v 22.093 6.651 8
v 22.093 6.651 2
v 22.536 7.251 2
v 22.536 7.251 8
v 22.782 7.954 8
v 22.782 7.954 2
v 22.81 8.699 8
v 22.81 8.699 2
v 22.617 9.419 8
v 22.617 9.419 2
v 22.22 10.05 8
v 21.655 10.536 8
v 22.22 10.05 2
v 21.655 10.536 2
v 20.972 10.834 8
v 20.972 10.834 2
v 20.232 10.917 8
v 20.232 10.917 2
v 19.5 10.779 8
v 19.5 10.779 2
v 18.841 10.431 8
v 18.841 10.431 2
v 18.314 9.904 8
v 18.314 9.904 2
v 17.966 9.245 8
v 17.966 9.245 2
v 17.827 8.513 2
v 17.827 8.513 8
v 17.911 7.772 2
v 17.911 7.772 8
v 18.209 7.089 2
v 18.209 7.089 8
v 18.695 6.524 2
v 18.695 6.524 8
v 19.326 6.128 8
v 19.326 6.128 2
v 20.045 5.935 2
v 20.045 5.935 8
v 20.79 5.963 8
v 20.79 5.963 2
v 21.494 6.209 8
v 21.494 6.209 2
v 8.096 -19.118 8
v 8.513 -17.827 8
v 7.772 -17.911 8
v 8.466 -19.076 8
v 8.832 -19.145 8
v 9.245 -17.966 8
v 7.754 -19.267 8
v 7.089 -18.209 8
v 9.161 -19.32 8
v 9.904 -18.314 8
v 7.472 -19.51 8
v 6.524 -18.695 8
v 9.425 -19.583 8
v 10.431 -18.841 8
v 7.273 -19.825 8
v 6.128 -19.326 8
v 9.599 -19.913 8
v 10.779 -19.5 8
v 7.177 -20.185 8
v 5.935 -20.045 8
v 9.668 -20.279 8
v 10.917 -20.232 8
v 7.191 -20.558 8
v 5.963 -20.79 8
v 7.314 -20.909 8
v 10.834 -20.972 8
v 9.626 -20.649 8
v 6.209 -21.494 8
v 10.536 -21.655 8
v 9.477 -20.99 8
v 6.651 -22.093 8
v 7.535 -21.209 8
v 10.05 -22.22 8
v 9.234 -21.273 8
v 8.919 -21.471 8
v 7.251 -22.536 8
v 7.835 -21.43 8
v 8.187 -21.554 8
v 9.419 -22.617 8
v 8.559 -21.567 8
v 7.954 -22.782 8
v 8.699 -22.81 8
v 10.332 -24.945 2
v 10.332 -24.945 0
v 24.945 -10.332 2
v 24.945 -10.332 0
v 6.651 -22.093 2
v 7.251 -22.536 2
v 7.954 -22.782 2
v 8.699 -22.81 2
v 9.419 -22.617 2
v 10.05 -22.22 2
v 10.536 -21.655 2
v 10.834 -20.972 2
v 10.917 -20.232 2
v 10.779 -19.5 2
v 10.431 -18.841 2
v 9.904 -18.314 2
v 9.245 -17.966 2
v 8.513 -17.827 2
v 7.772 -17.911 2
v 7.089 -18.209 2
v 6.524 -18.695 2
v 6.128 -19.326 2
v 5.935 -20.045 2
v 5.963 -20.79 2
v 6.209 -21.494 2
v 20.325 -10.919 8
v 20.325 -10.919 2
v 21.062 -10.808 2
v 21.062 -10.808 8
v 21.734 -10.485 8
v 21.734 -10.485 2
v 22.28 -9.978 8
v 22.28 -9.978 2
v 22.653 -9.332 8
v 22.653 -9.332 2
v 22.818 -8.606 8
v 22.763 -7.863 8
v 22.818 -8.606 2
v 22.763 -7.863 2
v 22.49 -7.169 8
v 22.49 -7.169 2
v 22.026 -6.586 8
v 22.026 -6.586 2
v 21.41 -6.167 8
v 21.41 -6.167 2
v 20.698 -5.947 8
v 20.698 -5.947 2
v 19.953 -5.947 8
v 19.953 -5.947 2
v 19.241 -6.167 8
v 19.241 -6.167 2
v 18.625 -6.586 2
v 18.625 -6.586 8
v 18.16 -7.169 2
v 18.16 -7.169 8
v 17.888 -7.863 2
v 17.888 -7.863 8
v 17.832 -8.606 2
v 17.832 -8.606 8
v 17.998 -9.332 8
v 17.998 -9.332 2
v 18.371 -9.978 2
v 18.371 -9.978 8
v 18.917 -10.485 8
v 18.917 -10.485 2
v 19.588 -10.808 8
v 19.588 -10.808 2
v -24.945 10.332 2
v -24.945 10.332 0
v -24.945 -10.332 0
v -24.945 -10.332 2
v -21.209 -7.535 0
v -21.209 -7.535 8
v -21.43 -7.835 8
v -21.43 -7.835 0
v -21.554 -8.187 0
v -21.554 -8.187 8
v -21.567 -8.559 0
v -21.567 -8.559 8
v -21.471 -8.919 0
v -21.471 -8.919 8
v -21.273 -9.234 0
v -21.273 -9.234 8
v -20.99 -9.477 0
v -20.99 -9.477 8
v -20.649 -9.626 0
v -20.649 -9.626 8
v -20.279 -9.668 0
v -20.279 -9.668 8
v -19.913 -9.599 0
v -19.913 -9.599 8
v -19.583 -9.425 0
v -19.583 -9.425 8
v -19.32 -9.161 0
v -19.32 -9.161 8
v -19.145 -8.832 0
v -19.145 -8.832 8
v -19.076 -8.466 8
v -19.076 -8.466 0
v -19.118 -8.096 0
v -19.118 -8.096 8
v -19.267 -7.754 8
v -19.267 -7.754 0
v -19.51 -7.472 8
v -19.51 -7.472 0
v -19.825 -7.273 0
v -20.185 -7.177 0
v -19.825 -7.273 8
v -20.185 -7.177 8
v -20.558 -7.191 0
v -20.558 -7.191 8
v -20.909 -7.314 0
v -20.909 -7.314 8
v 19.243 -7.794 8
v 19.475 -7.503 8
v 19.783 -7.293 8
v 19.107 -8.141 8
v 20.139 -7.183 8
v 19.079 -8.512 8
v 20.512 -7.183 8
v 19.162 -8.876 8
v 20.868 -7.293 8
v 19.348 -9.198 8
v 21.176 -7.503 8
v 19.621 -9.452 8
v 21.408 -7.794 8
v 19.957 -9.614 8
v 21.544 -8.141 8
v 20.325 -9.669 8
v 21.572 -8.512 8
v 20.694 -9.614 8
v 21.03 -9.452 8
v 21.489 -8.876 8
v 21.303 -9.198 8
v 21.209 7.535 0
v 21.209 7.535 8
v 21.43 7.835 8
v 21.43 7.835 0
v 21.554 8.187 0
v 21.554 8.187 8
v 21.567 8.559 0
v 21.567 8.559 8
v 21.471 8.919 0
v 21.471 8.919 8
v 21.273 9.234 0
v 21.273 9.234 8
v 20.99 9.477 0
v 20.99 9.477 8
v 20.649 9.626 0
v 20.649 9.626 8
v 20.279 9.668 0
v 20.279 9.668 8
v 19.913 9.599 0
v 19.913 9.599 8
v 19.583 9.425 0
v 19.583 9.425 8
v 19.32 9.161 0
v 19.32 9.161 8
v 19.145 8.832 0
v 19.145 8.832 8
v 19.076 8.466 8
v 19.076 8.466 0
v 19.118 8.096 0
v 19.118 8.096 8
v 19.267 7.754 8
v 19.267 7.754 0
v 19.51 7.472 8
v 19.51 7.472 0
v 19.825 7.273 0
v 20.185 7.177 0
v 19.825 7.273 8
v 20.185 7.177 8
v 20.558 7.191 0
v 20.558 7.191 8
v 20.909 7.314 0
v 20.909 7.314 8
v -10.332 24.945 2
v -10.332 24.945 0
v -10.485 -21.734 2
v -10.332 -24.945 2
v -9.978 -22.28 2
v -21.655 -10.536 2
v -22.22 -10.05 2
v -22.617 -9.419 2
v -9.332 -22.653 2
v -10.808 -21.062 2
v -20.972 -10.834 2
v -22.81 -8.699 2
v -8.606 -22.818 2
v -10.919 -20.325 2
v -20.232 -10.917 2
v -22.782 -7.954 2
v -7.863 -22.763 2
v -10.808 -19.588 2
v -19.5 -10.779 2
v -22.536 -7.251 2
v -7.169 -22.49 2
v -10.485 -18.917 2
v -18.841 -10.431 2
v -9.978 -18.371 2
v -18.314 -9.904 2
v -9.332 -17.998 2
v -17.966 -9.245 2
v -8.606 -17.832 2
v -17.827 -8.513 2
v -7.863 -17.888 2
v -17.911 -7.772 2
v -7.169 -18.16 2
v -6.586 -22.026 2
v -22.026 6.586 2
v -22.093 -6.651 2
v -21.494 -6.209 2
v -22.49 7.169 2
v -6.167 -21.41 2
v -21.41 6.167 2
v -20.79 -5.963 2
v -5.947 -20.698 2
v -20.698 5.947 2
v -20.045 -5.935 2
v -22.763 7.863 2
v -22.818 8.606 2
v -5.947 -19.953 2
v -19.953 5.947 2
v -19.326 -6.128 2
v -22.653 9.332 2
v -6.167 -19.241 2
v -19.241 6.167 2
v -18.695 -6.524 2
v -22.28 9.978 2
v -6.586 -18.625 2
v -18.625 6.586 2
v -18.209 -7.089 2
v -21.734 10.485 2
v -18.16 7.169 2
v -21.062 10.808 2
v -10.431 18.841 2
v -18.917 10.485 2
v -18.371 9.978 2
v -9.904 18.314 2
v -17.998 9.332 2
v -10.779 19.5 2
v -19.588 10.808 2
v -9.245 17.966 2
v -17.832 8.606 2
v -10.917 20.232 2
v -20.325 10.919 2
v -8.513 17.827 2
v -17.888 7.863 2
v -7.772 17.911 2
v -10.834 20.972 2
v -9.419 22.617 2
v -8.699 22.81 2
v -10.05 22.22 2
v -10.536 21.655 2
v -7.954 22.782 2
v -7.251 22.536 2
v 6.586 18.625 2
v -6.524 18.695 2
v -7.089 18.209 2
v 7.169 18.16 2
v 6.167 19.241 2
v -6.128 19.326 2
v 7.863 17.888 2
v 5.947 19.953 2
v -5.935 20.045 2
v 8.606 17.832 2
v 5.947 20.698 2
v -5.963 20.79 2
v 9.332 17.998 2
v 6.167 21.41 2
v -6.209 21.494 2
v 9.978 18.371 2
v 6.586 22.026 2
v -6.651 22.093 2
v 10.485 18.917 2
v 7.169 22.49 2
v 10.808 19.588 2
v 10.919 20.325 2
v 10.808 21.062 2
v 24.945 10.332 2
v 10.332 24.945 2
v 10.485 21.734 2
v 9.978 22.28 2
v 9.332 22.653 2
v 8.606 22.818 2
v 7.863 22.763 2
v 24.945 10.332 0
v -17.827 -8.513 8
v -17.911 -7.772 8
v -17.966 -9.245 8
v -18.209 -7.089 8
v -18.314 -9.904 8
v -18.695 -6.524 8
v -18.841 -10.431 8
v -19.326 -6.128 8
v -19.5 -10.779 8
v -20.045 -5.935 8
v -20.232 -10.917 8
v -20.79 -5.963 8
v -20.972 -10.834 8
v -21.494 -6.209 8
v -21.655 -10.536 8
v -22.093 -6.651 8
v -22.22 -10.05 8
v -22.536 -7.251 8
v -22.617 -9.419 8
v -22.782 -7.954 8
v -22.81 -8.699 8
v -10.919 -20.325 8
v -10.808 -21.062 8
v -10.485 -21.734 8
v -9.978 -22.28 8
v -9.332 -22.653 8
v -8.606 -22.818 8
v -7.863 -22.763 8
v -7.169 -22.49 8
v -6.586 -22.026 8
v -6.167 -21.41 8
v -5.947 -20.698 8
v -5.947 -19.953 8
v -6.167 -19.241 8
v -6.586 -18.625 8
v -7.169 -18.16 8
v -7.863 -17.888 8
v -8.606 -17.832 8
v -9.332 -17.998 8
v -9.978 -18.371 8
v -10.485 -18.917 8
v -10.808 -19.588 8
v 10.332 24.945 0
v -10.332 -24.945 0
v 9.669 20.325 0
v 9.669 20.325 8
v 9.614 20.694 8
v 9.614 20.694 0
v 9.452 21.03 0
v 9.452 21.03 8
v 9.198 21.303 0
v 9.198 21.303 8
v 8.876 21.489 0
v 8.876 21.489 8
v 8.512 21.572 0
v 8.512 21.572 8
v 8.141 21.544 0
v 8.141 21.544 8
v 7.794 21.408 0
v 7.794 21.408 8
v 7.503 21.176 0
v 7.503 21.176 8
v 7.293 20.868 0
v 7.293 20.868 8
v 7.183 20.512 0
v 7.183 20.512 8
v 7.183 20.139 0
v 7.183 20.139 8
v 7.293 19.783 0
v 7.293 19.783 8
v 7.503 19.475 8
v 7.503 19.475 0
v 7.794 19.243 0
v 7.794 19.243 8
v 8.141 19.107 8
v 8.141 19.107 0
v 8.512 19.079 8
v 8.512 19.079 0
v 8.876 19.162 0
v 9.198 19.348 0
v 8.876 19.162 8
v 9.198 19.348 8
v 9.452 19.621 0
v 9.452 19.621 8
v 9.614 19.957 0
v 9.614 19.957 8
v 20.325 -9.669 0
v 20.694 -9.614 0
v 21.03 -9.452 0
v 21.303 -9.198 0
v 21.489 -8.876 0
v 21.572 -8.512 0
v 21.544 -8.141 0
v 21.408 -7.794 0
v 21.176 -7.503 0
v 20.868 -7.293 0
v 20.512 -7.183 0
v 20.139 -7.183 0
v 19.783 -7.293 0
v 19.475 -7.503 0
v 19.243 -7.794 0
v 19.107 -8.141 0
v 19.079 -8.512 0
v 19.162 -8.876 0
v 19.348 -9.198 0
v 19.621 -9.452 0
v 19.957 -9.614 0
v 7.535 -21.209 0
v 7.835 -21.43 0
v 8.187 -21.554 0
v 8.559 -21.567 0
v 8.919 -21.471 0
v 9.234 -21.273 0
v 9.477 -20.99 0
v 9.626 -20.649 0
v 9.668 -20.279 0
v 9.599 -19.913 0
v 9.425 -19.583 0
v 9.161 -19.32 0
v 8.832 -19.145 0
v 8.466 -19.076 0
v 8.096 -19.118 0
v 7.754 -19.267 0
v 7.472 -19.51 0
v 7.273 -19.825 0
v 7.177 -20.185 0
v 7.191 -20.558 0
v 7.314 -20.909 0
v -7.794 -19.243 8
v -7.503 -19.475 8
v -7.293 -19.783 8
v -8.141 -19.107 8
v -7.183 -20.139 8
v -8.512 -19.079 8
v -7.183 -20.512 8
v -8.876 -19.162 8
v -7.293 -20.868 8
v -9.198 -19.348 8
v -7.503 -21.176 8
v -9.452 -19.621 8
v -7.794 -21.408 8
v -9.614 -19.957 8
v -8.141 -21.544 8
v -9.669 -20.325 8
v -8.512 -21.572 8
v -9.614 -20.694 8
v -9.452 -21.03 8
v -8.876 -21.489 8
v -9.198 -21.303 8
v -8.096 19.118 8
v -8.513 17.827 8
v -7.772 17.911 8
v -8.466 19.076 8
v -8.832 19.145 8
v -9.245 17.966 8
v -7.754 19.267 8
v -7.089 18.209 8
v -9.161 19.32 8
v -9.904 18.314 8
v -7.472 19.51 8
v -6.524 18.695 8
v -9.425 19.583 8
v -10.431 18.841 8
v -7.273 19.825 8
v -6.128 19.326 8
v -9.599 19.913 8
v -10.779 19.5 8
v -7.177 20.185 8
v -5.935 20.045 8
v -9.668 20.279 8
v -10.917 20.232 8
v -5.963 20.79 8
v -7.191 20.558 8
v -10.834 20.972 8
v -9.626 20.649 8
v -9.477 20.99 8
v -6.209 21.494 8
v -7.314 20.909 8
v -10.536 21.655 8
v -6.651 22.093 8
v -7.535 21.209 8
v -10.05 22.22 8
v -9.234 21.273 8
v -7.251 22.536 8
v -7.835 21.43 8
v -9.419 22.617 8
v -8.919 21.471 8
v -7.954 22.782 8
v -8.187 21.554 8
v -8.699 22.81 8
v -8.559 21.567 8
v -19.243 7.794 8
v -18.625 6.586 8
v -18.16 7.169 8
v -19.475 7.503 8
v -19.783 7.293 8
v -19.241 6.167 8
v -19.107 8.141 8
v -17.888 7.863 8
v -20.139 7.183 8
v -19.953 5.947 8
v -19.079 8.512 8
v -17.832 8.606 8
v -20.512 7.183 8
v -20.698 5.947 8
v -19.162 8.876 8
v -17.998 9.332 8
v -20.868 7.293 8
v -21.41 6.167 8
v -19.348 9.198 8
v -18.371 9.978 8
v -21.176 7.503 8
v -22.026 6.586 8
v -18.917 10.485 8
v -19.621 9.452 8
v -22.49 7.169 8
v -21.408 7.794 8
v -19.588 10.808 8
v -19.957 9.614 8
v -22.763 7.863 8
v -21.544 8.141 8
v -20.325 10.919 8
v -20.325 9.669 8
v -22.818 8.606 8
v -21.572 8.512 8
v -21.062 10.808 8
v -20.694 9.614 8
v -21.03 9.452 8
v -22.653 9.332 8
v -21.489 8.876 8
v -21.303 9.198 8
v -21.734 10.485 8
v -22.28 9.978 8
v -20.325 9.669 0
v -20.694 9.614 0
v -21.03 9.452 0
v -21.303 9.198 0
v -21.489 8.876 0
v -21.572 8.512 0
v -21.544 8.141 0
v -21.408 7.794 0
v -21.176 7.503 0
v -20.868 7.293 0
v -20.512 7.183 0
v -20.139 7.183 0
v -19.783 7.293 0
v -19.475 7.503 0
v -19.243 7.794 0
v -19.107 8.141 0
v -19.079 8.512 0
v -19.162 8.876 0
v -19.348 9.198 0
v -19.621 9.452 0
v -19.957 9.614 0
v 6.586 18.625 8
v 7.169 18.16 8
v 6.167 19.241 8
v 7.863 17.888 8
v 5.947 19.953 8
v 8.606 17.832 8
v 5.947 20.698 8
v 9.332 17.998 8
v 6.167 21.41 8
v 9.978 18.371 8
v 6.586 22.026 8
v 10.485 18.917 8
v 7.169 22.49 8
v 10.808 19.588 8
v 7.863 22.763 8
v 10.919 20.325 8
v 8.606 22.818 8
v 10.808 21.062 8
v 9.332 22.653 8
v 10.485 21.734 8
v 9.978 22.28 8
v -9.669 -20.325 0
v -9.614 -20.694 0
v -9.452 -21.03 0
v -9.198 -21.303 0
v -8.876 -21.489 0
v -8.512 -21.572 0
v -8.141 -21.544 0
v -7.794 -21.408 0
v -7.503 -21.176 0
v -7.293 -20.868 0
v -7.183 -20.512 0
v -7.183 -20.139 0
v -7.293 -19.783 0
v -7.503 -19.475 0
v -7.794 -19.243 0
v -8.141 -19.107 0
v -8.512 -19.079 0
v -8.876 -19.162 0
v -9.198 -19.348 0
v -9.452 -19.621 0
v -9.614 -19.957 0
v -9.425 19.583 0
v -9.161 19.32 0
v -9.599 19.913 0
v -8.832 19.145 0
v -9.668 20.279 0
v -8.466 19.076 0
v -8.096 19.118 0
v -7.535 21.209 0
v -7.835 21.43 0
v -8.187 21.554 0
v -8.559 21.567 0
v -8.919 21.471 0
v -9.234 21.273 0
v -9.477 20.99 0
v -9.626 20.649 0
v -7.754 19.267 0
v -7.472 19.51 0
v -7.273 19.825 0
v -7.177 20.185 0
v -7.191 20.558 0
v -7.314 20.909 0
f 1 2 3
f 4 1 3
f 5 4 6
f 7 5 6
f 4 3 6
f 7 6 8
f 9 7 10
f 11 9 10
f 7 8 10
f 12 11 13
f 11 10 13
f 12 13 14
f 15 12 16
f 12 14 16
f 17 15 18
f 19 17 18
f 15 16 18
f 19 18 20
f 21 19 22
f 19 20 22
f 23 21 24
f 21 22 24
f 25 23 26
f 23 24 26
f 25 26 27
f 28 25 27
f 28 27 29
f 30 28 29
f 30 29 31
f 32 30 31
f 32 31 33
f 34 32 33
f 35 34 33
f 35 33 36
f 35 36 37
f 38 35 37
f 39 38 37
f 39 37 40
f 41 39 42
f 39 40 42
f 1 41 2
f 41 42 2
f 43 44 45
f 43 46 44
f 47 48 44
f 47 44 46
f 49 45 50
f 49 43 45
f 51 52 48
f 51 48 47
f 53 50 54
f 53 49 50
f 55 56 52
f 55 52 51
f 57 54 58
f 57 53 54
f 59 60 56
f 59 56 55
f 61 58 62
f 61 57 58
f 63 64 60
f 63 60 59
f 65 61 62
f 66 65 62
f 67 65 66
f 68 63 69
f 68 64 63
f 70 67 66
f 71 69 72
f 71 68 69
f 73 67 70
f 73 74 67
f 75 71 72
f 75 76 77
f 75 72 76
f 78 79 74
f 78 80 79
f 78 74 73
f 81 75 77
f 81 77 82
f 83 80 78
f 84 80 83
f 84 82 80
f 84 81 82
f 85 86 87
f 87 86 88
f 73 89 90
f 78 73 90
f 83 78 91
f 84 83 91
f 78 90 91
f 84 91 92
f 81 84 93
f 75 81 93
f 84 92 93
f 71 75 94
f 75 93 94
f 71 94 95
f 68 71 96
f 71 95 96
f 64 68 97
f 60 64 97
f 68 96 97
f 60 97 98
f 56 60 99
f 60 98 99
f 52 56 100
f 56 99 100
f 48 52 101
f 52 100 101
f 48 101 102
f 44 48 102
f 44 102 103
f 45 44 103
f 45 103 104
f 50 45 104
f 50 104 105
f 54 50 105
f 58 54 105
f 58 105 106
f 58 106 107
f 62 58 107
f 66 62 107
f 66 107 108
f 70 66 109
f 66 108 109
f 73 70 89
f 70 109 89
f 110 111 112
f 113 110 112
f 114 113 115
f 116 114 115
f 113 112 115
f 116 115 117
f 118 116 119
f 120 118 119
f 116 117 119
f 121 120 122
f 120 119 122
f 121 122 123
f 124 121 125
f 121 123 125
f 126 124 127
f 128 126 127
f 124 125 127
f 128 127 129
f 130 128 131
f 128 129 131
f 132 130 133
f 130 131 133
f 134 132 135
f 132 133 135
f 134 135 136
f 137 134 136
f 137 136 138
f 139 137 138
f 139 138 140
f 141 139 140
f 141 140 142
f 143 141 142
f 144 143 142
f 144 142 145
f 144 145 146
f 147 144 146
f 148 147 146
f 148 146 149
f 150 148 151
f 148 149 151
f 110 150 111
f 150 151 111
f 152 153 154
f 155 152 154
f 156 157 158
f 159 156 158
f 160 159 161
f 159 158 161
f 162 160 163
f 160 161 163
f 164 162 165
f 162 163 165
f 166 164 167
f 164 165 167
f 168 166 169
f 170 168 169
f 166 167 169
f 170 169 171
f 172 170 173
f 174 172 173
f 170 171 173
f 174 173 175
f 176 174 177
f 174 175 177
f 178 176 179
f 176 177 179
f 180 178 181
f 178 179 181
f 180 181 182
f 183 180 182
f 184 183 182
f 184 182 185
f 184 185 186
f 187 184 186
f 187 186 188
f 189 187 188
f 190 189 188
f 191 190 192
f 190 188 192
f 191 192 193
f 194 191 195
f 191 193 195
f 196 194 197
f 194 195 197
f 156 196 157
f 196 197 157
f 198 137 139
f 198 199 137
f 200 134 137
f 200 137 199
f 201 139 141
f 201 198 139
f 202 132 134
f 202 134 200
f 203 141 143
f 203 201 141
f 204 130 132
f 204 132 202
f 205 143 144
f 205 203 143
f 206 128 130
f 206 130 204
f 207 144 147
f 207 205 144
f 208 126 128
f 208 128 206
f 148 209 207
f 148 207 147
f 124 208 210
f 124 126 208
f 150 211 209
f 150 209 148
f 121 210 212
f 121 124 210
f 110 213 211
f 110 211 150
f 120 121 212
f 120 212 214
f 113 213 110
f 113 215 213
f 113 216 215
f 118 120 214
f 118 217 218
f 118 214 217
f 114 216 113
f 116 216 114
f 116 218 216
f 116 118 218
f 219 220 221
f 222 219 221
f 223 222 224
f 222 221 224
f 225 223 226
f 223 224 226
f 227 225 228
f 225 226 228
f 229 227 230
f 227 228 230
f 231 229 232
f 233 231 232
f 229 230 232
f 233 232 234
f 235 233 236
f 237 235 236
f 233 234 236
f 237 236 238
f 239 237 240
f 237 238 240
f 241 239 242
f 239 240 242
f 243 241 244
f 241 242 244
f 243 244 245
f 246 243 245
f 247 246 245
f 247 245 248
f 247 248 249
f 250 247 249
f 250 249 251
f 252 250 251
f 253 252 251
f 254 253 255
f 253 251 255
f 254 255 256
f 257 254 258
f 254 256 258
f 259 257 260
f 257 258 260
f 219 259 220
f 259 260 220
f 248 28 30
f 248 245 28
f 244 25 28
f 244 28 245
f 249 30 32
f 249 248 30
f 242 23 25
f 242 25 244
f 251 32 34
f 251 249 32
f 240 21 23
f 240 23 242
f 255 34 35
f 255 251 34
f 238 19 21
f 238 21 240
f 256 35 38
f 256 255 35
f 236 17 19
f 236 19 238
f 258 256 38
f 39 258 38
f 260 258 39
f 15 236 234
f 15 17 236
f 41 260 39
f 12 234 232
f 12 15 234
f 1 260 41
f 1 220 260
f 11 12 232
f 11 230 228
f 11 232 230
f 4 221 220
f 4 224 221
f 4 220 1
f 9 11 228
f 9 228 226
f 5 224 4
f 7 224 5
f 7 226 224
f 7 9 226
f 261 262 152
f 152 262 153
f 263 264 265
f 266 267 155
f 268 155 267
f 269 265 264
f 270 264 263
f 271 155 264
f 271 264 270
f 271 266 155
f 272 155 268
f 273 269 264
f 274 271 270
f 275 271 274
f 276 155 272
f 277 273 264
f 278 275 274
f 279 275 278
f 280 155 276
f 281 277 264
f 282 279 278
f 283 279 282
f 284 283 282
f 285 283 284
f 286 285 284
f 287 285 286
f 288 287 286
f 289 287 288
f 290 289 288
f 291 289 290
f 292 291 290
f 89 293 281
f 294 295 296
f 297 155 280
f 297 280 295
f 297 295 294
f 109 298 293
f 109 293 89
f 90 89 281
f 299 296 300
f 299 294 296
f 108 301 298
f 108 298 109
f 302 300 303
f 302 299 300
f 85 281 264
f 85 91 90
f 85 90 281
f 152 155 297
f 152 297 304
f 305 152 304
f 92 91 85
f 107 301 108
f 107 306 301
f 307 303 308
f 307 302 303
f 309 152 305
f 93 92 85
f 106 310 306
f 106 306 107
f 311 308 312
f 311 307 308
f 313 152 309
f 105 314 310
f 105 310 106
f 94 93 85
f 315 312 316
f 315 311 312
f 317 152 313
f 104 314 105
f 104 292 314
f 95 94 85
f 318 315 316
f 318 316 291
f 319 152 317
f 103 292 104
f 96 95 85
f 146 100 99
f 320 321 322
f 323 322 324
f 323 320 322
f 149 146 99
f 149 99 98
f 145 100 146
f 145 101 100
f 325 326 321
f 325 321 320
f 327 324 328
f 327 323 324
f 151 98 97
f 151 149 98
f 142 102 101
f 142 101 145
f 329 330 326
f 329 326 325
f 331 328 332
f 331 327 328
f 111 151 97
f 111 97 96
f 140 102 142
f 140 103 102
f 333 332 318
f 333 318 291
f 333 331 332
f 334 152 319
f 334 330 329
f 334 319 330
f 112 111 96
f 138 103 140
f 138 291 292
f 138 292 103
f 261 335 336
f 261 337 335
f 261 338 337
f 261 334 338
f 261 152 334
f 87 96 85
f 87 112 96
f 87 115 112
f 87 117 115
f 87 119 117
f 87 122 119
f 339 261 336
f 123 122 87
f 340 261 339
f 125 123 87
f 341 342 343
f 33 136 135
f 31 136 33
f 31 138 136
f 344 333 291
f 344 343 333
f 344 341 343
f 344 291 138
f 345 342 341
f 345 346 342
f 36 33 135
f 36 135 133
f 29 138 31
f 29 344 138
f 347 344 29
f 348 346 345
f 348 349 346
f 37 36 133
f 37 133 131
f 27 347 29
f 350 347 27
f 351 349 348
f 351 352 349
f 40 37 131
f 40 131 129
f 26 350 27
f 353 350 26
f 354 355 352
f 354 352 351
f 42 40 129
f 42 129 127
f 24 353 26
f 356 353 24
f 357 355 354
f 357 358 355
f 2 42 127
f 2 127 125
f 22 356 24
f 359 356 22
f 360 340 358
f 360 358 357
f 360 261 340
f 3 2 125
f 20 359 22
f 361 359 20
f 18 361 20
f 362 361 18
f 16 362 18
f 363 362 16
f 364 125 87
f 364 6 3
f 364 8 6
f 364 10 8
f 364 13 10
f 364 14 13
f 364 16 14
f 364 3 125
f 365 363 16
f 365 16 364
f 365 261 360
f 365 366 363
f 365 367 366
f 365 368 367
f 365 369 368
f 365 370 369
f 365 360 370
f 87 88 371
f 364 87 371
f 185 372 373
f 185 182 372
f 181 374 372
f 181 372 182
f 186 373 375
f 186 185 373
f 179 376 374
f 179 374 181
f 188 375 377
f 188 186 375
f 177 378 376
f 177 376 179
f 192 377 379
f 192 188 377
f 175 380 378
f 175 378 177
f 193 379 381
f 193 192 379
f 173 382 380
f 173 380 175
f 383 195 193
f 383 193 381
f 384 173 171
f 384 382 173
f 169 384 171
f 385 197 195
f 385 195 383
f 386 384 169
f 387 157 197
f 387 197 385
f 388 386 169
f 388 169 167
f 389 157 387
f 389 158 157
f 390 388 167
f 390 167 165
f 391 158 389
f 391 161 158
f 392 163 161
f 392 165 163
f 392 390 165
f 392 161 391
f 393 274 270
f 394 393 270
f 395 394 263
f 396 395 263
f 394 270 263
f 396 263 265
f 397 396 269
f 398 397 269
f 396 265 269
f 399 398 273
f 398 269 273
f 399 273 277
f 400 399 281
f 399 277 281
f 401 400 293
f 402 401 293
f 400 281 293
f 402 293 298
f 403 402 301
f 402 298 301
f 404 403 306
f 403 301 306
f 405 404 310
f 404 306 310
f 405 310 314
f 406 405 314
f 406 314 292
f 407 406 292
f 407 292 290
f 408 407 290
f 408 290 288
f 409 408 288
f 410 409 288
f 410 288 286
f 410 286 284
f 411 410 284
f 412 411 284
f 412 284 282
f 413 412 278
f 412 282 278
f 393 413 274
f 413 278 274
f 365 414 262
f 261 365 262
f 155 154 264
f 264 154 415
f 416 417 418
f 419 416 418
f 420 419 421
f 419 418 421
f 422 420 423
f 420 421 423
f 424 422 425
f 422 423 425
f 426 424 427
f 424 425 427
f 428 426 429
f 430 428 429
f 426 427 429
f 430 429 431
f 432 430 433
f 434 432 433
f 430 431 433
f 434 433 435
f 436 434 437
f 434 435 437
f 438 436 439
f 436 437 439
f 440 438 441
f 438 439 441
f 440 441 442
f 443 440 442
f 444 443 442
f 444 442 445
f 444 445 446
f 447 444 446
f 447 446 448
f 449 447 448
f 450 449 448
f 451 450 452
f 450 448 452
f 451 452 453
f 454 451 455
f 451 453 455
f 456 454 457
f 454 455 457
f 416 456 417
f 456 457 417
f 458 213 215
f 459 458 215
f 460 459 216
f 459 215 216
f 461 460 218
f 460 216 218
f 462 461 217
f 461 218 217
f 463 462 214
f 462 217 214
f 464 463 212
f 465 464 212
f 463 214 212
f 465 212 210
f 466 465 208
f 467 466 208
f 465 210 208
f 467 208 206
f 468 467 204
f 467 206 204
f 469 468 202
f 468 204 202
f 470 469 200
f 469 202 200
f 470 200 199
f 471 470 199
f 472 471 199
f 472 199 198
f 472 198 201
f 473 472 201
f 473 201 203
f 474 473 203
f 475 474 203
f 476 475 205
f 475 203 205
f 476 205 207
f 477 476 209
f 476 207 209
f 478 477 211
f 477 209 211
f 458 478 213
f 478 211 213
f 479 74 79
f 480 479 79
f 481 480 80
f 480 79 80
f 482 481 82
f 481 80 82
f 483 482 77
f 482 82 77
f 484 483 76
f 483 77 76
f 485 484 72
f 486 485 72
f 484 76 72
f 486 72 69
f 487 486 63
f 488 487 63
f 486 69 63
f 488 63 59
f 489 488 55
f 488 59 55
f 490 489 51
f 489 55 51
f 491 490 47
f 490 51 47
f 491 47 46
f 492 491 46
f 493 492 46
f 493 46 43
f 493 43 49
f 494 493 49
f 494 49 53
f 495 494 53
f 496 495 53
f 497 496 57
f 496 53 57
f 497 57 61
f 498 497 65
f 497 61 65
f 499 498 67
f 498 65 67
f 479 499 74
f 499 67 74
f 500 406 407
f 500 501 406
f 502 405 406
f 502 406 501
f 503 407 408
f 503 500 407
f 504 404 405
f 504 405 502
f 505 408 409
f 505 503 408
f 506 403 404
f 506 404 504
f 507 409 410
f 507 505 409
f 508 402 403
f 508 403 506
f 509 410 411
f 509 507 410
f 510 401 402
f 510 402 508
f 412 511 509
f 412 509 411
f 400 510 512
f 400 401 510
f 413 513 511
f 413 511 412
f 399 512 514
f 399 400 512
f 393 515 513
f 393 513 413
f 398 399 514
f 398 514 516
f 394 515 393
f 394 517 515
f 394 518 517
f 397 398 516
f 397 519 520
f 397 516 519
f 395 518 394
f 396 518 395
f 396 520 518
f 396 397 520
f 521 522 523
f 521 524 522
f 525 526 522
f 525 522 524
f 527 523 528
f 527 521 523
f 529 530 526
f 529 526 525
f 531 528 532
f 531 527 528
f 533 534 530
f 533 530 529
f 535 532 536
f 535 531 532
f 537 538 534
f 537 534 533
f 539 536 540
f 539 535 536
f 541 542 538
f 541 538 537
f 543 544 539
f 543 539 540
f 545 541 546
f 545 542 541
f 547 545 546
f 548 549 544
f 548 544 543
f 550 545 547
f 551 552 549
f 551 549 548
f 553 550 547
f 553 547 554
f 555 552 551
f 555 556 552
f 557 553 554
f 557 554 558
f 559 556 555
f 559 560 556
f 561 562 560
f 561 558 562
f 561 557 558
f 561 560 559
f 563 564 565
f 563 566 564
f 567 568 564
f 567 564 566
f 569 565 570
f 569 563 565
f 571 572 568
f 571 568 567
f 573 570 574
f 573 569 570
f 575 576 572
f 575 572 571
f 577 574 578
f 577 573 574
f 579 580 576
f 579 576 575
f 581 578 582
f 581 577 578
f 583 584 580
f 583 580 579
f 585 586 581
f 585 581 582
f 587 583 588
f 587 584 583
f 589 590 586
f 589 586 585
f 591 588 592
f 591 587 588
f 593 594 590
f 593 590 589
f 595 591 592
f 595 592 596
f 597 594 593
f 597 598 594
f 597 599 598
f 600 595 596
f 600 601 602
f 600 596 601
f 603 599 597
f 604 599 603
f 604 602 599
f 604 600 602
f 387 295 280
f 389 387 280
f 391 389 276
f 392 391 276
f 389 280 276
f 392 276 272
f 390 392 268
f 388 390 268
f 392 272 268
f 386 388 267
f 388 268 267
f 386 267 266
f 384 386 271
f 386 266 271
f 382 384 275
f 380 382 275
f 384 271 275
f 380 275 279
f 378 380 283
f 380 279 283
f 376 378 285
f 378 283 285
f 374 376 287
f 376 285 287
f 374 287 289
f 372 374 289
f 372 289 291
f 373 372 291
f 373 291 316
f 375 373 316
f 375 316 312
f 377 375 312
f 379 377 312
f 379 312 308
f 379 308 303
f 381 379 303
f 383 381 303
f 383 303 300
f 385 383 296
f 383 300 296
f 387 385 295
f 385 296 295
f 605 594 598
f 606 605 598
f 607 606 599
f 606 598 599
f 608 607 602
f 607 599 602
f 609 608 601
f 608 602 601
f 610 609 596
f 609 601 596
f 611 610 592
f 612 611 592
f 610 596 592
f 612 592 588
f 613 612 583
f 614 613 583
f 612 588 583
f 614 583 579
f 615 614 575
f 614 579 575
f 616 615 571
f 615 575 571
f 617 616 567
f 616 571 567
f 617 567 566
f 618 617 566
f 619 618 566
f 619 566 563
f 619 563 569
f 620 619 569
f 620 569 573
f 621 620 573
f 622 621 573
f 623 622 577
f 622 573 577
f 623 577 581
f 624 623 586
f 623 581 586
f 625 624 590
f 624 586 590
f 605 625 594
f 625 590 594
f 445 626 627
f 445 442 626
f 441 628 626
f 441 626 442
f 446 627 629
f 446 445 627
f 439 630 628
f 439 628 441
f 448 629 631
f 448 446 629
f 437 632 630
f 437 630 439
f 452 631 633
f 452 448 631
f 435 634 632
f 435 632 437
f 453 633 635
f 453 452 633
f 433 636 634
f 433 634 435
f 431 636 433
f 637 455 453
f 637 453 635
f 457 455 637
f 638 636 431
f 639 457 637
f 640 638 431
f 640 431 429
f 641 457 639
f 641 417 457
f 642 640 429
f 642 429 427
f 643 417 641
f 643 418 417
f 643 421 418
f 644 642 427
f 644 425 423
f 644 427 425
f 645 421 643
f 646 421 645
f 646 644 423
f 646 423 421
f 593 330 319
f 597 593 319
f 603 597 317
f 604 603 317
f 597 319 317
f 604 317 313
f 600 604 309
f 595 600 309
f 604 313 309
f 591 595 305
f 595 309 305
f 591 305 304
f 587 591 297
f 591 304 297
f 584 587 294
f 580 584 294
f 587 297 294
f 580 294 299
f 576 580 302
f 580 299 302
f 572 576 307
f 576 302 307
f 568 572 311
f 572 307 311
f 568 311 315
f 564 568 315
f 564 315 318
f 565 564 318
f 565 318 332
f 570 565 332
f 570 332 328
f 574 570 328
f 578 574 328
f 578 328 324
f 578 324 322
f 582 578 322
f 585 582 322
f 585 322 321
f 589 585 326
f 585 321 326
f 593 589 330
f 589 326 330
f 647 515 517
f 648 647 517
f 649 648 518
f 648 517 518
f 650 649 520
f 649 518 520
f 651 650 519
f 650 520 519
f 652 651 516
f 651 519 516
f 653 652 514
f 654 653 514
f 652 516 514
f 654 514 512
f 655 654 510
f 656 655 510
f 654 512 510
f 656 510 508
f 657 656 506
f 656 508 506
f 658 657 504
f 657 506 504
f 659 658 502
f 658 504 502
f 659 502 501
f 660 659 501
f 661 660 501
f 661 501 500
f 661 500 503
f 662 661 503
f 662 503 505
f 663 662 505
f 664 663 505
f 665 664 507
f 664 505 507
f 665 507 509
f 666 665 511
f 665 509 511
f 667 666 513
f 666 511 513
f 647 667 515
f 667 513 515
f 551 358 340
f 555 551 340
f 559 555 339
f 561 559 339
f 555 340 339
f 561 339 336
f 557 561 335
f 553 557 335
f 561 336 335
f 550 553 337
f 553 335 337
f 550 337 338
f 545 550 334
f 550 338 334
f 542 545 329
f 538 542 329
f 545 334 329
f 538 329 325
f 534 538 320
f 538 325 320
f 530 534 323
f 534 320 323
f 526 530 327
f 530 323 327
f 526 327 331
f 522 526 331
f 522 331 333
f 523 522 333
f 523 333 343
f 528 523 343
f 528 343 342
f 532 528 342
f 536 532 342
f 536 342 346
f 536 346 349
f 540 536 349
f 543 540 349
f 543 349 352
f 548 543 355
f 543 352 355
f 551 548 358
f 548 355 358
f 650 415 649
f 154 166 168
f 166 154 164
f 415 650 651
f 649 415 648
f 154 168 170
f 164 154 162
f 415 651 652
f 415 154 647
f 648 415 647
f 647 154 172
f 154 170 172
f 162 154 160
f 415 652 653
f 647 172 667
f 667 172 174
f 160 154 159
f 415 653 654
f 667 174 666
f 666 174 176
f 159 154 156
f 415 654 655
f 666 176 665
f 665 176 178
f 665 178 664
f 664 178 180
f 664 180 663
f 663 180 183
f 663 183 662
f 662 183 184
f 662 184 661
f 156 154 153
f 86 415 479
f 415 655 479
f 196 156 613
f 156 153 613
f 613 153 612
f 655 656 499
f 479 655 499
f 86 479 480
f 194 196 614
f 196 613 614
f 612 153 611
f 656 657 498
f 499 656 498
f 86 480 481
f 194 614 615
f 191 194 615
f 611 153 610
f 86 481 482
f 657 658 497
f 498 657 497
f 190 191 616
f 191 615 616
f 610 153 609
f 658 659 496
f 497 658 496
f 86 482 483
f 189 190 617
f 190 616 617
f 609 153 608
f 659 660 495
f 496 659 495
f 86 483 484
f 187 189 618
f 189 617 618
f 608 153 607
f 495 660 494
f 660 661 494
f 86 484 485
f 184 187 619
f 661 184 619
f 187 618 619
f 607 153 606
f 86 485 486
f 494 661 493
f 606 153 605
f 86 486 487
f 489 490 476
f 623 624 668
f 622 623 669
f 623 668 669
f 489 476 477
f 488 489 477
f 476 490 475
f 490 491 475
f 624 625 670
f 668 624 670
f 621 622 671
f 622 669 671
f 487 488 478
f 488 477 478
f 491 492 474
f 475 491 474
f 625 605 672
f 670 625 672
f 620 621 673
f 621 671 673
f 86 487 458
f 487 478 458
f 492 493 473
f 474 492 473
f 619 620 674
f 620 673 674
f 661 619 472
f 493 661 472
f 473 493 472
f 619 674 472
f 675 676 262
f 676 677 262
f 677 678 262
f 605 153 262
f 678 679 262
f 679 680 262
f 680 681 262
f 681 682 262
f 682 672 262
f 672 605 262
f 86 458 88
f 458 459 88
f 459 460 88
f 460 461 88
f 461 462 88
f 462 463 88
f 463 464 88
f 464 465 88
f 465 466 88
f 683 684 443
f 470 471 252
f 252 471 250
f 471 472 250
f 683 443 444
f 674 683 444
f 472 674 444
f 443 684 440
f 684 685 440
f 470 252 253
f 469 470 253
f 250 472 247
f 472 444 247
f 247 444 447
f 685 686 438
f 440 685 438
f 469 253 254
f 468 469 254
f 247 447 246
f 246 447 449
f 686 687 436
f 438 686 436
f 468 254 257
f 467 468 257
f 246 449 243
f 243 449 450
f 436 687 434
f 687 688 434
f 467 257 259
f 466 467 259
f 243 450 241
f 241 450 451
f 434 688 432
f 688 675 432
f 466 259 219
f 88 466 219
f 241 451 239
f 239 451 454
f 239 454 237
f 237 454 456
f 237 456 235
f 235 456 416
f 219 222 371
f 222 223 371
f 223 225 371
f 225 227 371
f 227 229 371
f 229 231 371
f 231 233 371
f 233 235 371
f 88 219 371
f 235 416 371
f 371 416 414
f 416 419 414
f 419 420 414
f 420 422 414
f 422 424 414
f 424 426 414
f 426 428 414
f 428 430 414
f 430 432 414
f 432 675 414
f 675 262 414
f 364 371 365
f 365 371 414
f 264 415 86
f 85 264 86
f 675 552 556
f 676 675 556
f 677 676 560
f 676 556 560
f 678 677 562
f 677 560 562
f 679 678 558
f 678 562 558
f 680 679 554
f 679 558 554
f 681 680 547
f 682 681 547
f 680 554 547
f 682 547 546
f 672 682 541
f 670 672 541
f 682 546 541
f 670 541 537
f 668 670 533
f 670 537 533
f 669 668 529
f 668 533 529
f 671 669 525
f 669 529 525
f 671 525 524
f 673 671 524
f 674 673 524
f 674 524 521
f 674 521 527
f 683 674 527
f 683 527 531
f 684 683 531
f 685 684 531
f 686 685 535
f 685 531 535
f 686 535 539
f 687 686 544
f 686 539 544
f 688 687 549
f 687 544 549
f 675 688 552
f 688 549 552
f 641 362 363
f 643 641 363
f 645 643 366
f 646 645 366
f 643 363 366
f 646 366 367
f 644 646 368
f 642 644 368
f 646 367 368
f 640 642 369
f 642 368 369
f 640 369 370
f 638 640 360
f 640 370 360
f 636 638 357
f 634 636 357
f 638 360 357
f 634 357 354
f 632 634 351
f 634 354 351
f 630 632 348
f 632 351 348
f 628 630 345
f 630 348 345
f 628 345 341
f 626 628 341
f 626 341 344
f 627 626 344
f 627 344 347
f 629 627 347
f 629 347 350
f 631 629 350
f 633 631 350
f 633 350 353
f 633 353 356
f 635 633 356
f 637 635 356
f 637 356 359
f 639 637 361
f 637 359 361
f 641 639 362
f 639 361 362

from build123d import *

# Parameters (mm, degrees)
PAD_DEPTH             = 2
SKETCH001_R           = 2.5
PAD001_DEPTH          = 6
SKETCH002_R           = 1.25
POCKET_DEPTH          = 8
POLARPATTERN_COUNT    = 8
POLARPATTERN001_COUNT = 8


with BuildPart() as part:
    # Sketch → Pad (new body)
    with BuildSketch(Plane.XY):
        Polygon((24.944747, -10.332453), (24.944747, 10.332453), (10.332453, 24.944747), (-10.332453, 24.944747), (-24.944747, 10.332453), (-24.944747, -10.332453), (-10.332453, -24.944747), (10.332453, -24.944747), align=None)
    extrude(amount=PAD_DEPTH)

    # Sketch001 (on Face10 of Pad) → Pad001 (join)
    with BuildSketch(Plane.XY.offset(2)):
        with Locations((8.419036, 20.32535)):
            Circle(SKETCH001_R)
    pad001 = extrude(amount=PAD001_DEPTH)

    # Sketch002 (on Face12 of Pad001) → Pocket (cut)
    with BuildSketch(Plane.XY.offset(8)):
        with Locations((8.419036, 20.32535)):
            Circle(SKETCH002_R)
    pocket = extrude(amount=-POCKET_DEPTH, mode=Mode.SUBTRACT)

    # PolarPattern: Pad001 ×8 about axis
    polarpattern_axis = Axis((0, 0, 2), (0, 0, 1))
    for i in range(1, POLARPATTERN_COUNT):
        add(pad001.rotate(polarpattern_axis, i * 360 / POLARPATTERN_COUNT))

    # PolarPattern001: Pocket ×8 about axis
    polarpattern001_axis = Axis((0, 0, 8), (0, 0, 1))
    for i in range(1, POLARPATTERN001_COUNT):
        add(pocket.rotate(polarpattern001_axis, i * 360 / POLARPATTERN001_COUNT), mode=Mode.SUBTRACT)


solid = part.part
